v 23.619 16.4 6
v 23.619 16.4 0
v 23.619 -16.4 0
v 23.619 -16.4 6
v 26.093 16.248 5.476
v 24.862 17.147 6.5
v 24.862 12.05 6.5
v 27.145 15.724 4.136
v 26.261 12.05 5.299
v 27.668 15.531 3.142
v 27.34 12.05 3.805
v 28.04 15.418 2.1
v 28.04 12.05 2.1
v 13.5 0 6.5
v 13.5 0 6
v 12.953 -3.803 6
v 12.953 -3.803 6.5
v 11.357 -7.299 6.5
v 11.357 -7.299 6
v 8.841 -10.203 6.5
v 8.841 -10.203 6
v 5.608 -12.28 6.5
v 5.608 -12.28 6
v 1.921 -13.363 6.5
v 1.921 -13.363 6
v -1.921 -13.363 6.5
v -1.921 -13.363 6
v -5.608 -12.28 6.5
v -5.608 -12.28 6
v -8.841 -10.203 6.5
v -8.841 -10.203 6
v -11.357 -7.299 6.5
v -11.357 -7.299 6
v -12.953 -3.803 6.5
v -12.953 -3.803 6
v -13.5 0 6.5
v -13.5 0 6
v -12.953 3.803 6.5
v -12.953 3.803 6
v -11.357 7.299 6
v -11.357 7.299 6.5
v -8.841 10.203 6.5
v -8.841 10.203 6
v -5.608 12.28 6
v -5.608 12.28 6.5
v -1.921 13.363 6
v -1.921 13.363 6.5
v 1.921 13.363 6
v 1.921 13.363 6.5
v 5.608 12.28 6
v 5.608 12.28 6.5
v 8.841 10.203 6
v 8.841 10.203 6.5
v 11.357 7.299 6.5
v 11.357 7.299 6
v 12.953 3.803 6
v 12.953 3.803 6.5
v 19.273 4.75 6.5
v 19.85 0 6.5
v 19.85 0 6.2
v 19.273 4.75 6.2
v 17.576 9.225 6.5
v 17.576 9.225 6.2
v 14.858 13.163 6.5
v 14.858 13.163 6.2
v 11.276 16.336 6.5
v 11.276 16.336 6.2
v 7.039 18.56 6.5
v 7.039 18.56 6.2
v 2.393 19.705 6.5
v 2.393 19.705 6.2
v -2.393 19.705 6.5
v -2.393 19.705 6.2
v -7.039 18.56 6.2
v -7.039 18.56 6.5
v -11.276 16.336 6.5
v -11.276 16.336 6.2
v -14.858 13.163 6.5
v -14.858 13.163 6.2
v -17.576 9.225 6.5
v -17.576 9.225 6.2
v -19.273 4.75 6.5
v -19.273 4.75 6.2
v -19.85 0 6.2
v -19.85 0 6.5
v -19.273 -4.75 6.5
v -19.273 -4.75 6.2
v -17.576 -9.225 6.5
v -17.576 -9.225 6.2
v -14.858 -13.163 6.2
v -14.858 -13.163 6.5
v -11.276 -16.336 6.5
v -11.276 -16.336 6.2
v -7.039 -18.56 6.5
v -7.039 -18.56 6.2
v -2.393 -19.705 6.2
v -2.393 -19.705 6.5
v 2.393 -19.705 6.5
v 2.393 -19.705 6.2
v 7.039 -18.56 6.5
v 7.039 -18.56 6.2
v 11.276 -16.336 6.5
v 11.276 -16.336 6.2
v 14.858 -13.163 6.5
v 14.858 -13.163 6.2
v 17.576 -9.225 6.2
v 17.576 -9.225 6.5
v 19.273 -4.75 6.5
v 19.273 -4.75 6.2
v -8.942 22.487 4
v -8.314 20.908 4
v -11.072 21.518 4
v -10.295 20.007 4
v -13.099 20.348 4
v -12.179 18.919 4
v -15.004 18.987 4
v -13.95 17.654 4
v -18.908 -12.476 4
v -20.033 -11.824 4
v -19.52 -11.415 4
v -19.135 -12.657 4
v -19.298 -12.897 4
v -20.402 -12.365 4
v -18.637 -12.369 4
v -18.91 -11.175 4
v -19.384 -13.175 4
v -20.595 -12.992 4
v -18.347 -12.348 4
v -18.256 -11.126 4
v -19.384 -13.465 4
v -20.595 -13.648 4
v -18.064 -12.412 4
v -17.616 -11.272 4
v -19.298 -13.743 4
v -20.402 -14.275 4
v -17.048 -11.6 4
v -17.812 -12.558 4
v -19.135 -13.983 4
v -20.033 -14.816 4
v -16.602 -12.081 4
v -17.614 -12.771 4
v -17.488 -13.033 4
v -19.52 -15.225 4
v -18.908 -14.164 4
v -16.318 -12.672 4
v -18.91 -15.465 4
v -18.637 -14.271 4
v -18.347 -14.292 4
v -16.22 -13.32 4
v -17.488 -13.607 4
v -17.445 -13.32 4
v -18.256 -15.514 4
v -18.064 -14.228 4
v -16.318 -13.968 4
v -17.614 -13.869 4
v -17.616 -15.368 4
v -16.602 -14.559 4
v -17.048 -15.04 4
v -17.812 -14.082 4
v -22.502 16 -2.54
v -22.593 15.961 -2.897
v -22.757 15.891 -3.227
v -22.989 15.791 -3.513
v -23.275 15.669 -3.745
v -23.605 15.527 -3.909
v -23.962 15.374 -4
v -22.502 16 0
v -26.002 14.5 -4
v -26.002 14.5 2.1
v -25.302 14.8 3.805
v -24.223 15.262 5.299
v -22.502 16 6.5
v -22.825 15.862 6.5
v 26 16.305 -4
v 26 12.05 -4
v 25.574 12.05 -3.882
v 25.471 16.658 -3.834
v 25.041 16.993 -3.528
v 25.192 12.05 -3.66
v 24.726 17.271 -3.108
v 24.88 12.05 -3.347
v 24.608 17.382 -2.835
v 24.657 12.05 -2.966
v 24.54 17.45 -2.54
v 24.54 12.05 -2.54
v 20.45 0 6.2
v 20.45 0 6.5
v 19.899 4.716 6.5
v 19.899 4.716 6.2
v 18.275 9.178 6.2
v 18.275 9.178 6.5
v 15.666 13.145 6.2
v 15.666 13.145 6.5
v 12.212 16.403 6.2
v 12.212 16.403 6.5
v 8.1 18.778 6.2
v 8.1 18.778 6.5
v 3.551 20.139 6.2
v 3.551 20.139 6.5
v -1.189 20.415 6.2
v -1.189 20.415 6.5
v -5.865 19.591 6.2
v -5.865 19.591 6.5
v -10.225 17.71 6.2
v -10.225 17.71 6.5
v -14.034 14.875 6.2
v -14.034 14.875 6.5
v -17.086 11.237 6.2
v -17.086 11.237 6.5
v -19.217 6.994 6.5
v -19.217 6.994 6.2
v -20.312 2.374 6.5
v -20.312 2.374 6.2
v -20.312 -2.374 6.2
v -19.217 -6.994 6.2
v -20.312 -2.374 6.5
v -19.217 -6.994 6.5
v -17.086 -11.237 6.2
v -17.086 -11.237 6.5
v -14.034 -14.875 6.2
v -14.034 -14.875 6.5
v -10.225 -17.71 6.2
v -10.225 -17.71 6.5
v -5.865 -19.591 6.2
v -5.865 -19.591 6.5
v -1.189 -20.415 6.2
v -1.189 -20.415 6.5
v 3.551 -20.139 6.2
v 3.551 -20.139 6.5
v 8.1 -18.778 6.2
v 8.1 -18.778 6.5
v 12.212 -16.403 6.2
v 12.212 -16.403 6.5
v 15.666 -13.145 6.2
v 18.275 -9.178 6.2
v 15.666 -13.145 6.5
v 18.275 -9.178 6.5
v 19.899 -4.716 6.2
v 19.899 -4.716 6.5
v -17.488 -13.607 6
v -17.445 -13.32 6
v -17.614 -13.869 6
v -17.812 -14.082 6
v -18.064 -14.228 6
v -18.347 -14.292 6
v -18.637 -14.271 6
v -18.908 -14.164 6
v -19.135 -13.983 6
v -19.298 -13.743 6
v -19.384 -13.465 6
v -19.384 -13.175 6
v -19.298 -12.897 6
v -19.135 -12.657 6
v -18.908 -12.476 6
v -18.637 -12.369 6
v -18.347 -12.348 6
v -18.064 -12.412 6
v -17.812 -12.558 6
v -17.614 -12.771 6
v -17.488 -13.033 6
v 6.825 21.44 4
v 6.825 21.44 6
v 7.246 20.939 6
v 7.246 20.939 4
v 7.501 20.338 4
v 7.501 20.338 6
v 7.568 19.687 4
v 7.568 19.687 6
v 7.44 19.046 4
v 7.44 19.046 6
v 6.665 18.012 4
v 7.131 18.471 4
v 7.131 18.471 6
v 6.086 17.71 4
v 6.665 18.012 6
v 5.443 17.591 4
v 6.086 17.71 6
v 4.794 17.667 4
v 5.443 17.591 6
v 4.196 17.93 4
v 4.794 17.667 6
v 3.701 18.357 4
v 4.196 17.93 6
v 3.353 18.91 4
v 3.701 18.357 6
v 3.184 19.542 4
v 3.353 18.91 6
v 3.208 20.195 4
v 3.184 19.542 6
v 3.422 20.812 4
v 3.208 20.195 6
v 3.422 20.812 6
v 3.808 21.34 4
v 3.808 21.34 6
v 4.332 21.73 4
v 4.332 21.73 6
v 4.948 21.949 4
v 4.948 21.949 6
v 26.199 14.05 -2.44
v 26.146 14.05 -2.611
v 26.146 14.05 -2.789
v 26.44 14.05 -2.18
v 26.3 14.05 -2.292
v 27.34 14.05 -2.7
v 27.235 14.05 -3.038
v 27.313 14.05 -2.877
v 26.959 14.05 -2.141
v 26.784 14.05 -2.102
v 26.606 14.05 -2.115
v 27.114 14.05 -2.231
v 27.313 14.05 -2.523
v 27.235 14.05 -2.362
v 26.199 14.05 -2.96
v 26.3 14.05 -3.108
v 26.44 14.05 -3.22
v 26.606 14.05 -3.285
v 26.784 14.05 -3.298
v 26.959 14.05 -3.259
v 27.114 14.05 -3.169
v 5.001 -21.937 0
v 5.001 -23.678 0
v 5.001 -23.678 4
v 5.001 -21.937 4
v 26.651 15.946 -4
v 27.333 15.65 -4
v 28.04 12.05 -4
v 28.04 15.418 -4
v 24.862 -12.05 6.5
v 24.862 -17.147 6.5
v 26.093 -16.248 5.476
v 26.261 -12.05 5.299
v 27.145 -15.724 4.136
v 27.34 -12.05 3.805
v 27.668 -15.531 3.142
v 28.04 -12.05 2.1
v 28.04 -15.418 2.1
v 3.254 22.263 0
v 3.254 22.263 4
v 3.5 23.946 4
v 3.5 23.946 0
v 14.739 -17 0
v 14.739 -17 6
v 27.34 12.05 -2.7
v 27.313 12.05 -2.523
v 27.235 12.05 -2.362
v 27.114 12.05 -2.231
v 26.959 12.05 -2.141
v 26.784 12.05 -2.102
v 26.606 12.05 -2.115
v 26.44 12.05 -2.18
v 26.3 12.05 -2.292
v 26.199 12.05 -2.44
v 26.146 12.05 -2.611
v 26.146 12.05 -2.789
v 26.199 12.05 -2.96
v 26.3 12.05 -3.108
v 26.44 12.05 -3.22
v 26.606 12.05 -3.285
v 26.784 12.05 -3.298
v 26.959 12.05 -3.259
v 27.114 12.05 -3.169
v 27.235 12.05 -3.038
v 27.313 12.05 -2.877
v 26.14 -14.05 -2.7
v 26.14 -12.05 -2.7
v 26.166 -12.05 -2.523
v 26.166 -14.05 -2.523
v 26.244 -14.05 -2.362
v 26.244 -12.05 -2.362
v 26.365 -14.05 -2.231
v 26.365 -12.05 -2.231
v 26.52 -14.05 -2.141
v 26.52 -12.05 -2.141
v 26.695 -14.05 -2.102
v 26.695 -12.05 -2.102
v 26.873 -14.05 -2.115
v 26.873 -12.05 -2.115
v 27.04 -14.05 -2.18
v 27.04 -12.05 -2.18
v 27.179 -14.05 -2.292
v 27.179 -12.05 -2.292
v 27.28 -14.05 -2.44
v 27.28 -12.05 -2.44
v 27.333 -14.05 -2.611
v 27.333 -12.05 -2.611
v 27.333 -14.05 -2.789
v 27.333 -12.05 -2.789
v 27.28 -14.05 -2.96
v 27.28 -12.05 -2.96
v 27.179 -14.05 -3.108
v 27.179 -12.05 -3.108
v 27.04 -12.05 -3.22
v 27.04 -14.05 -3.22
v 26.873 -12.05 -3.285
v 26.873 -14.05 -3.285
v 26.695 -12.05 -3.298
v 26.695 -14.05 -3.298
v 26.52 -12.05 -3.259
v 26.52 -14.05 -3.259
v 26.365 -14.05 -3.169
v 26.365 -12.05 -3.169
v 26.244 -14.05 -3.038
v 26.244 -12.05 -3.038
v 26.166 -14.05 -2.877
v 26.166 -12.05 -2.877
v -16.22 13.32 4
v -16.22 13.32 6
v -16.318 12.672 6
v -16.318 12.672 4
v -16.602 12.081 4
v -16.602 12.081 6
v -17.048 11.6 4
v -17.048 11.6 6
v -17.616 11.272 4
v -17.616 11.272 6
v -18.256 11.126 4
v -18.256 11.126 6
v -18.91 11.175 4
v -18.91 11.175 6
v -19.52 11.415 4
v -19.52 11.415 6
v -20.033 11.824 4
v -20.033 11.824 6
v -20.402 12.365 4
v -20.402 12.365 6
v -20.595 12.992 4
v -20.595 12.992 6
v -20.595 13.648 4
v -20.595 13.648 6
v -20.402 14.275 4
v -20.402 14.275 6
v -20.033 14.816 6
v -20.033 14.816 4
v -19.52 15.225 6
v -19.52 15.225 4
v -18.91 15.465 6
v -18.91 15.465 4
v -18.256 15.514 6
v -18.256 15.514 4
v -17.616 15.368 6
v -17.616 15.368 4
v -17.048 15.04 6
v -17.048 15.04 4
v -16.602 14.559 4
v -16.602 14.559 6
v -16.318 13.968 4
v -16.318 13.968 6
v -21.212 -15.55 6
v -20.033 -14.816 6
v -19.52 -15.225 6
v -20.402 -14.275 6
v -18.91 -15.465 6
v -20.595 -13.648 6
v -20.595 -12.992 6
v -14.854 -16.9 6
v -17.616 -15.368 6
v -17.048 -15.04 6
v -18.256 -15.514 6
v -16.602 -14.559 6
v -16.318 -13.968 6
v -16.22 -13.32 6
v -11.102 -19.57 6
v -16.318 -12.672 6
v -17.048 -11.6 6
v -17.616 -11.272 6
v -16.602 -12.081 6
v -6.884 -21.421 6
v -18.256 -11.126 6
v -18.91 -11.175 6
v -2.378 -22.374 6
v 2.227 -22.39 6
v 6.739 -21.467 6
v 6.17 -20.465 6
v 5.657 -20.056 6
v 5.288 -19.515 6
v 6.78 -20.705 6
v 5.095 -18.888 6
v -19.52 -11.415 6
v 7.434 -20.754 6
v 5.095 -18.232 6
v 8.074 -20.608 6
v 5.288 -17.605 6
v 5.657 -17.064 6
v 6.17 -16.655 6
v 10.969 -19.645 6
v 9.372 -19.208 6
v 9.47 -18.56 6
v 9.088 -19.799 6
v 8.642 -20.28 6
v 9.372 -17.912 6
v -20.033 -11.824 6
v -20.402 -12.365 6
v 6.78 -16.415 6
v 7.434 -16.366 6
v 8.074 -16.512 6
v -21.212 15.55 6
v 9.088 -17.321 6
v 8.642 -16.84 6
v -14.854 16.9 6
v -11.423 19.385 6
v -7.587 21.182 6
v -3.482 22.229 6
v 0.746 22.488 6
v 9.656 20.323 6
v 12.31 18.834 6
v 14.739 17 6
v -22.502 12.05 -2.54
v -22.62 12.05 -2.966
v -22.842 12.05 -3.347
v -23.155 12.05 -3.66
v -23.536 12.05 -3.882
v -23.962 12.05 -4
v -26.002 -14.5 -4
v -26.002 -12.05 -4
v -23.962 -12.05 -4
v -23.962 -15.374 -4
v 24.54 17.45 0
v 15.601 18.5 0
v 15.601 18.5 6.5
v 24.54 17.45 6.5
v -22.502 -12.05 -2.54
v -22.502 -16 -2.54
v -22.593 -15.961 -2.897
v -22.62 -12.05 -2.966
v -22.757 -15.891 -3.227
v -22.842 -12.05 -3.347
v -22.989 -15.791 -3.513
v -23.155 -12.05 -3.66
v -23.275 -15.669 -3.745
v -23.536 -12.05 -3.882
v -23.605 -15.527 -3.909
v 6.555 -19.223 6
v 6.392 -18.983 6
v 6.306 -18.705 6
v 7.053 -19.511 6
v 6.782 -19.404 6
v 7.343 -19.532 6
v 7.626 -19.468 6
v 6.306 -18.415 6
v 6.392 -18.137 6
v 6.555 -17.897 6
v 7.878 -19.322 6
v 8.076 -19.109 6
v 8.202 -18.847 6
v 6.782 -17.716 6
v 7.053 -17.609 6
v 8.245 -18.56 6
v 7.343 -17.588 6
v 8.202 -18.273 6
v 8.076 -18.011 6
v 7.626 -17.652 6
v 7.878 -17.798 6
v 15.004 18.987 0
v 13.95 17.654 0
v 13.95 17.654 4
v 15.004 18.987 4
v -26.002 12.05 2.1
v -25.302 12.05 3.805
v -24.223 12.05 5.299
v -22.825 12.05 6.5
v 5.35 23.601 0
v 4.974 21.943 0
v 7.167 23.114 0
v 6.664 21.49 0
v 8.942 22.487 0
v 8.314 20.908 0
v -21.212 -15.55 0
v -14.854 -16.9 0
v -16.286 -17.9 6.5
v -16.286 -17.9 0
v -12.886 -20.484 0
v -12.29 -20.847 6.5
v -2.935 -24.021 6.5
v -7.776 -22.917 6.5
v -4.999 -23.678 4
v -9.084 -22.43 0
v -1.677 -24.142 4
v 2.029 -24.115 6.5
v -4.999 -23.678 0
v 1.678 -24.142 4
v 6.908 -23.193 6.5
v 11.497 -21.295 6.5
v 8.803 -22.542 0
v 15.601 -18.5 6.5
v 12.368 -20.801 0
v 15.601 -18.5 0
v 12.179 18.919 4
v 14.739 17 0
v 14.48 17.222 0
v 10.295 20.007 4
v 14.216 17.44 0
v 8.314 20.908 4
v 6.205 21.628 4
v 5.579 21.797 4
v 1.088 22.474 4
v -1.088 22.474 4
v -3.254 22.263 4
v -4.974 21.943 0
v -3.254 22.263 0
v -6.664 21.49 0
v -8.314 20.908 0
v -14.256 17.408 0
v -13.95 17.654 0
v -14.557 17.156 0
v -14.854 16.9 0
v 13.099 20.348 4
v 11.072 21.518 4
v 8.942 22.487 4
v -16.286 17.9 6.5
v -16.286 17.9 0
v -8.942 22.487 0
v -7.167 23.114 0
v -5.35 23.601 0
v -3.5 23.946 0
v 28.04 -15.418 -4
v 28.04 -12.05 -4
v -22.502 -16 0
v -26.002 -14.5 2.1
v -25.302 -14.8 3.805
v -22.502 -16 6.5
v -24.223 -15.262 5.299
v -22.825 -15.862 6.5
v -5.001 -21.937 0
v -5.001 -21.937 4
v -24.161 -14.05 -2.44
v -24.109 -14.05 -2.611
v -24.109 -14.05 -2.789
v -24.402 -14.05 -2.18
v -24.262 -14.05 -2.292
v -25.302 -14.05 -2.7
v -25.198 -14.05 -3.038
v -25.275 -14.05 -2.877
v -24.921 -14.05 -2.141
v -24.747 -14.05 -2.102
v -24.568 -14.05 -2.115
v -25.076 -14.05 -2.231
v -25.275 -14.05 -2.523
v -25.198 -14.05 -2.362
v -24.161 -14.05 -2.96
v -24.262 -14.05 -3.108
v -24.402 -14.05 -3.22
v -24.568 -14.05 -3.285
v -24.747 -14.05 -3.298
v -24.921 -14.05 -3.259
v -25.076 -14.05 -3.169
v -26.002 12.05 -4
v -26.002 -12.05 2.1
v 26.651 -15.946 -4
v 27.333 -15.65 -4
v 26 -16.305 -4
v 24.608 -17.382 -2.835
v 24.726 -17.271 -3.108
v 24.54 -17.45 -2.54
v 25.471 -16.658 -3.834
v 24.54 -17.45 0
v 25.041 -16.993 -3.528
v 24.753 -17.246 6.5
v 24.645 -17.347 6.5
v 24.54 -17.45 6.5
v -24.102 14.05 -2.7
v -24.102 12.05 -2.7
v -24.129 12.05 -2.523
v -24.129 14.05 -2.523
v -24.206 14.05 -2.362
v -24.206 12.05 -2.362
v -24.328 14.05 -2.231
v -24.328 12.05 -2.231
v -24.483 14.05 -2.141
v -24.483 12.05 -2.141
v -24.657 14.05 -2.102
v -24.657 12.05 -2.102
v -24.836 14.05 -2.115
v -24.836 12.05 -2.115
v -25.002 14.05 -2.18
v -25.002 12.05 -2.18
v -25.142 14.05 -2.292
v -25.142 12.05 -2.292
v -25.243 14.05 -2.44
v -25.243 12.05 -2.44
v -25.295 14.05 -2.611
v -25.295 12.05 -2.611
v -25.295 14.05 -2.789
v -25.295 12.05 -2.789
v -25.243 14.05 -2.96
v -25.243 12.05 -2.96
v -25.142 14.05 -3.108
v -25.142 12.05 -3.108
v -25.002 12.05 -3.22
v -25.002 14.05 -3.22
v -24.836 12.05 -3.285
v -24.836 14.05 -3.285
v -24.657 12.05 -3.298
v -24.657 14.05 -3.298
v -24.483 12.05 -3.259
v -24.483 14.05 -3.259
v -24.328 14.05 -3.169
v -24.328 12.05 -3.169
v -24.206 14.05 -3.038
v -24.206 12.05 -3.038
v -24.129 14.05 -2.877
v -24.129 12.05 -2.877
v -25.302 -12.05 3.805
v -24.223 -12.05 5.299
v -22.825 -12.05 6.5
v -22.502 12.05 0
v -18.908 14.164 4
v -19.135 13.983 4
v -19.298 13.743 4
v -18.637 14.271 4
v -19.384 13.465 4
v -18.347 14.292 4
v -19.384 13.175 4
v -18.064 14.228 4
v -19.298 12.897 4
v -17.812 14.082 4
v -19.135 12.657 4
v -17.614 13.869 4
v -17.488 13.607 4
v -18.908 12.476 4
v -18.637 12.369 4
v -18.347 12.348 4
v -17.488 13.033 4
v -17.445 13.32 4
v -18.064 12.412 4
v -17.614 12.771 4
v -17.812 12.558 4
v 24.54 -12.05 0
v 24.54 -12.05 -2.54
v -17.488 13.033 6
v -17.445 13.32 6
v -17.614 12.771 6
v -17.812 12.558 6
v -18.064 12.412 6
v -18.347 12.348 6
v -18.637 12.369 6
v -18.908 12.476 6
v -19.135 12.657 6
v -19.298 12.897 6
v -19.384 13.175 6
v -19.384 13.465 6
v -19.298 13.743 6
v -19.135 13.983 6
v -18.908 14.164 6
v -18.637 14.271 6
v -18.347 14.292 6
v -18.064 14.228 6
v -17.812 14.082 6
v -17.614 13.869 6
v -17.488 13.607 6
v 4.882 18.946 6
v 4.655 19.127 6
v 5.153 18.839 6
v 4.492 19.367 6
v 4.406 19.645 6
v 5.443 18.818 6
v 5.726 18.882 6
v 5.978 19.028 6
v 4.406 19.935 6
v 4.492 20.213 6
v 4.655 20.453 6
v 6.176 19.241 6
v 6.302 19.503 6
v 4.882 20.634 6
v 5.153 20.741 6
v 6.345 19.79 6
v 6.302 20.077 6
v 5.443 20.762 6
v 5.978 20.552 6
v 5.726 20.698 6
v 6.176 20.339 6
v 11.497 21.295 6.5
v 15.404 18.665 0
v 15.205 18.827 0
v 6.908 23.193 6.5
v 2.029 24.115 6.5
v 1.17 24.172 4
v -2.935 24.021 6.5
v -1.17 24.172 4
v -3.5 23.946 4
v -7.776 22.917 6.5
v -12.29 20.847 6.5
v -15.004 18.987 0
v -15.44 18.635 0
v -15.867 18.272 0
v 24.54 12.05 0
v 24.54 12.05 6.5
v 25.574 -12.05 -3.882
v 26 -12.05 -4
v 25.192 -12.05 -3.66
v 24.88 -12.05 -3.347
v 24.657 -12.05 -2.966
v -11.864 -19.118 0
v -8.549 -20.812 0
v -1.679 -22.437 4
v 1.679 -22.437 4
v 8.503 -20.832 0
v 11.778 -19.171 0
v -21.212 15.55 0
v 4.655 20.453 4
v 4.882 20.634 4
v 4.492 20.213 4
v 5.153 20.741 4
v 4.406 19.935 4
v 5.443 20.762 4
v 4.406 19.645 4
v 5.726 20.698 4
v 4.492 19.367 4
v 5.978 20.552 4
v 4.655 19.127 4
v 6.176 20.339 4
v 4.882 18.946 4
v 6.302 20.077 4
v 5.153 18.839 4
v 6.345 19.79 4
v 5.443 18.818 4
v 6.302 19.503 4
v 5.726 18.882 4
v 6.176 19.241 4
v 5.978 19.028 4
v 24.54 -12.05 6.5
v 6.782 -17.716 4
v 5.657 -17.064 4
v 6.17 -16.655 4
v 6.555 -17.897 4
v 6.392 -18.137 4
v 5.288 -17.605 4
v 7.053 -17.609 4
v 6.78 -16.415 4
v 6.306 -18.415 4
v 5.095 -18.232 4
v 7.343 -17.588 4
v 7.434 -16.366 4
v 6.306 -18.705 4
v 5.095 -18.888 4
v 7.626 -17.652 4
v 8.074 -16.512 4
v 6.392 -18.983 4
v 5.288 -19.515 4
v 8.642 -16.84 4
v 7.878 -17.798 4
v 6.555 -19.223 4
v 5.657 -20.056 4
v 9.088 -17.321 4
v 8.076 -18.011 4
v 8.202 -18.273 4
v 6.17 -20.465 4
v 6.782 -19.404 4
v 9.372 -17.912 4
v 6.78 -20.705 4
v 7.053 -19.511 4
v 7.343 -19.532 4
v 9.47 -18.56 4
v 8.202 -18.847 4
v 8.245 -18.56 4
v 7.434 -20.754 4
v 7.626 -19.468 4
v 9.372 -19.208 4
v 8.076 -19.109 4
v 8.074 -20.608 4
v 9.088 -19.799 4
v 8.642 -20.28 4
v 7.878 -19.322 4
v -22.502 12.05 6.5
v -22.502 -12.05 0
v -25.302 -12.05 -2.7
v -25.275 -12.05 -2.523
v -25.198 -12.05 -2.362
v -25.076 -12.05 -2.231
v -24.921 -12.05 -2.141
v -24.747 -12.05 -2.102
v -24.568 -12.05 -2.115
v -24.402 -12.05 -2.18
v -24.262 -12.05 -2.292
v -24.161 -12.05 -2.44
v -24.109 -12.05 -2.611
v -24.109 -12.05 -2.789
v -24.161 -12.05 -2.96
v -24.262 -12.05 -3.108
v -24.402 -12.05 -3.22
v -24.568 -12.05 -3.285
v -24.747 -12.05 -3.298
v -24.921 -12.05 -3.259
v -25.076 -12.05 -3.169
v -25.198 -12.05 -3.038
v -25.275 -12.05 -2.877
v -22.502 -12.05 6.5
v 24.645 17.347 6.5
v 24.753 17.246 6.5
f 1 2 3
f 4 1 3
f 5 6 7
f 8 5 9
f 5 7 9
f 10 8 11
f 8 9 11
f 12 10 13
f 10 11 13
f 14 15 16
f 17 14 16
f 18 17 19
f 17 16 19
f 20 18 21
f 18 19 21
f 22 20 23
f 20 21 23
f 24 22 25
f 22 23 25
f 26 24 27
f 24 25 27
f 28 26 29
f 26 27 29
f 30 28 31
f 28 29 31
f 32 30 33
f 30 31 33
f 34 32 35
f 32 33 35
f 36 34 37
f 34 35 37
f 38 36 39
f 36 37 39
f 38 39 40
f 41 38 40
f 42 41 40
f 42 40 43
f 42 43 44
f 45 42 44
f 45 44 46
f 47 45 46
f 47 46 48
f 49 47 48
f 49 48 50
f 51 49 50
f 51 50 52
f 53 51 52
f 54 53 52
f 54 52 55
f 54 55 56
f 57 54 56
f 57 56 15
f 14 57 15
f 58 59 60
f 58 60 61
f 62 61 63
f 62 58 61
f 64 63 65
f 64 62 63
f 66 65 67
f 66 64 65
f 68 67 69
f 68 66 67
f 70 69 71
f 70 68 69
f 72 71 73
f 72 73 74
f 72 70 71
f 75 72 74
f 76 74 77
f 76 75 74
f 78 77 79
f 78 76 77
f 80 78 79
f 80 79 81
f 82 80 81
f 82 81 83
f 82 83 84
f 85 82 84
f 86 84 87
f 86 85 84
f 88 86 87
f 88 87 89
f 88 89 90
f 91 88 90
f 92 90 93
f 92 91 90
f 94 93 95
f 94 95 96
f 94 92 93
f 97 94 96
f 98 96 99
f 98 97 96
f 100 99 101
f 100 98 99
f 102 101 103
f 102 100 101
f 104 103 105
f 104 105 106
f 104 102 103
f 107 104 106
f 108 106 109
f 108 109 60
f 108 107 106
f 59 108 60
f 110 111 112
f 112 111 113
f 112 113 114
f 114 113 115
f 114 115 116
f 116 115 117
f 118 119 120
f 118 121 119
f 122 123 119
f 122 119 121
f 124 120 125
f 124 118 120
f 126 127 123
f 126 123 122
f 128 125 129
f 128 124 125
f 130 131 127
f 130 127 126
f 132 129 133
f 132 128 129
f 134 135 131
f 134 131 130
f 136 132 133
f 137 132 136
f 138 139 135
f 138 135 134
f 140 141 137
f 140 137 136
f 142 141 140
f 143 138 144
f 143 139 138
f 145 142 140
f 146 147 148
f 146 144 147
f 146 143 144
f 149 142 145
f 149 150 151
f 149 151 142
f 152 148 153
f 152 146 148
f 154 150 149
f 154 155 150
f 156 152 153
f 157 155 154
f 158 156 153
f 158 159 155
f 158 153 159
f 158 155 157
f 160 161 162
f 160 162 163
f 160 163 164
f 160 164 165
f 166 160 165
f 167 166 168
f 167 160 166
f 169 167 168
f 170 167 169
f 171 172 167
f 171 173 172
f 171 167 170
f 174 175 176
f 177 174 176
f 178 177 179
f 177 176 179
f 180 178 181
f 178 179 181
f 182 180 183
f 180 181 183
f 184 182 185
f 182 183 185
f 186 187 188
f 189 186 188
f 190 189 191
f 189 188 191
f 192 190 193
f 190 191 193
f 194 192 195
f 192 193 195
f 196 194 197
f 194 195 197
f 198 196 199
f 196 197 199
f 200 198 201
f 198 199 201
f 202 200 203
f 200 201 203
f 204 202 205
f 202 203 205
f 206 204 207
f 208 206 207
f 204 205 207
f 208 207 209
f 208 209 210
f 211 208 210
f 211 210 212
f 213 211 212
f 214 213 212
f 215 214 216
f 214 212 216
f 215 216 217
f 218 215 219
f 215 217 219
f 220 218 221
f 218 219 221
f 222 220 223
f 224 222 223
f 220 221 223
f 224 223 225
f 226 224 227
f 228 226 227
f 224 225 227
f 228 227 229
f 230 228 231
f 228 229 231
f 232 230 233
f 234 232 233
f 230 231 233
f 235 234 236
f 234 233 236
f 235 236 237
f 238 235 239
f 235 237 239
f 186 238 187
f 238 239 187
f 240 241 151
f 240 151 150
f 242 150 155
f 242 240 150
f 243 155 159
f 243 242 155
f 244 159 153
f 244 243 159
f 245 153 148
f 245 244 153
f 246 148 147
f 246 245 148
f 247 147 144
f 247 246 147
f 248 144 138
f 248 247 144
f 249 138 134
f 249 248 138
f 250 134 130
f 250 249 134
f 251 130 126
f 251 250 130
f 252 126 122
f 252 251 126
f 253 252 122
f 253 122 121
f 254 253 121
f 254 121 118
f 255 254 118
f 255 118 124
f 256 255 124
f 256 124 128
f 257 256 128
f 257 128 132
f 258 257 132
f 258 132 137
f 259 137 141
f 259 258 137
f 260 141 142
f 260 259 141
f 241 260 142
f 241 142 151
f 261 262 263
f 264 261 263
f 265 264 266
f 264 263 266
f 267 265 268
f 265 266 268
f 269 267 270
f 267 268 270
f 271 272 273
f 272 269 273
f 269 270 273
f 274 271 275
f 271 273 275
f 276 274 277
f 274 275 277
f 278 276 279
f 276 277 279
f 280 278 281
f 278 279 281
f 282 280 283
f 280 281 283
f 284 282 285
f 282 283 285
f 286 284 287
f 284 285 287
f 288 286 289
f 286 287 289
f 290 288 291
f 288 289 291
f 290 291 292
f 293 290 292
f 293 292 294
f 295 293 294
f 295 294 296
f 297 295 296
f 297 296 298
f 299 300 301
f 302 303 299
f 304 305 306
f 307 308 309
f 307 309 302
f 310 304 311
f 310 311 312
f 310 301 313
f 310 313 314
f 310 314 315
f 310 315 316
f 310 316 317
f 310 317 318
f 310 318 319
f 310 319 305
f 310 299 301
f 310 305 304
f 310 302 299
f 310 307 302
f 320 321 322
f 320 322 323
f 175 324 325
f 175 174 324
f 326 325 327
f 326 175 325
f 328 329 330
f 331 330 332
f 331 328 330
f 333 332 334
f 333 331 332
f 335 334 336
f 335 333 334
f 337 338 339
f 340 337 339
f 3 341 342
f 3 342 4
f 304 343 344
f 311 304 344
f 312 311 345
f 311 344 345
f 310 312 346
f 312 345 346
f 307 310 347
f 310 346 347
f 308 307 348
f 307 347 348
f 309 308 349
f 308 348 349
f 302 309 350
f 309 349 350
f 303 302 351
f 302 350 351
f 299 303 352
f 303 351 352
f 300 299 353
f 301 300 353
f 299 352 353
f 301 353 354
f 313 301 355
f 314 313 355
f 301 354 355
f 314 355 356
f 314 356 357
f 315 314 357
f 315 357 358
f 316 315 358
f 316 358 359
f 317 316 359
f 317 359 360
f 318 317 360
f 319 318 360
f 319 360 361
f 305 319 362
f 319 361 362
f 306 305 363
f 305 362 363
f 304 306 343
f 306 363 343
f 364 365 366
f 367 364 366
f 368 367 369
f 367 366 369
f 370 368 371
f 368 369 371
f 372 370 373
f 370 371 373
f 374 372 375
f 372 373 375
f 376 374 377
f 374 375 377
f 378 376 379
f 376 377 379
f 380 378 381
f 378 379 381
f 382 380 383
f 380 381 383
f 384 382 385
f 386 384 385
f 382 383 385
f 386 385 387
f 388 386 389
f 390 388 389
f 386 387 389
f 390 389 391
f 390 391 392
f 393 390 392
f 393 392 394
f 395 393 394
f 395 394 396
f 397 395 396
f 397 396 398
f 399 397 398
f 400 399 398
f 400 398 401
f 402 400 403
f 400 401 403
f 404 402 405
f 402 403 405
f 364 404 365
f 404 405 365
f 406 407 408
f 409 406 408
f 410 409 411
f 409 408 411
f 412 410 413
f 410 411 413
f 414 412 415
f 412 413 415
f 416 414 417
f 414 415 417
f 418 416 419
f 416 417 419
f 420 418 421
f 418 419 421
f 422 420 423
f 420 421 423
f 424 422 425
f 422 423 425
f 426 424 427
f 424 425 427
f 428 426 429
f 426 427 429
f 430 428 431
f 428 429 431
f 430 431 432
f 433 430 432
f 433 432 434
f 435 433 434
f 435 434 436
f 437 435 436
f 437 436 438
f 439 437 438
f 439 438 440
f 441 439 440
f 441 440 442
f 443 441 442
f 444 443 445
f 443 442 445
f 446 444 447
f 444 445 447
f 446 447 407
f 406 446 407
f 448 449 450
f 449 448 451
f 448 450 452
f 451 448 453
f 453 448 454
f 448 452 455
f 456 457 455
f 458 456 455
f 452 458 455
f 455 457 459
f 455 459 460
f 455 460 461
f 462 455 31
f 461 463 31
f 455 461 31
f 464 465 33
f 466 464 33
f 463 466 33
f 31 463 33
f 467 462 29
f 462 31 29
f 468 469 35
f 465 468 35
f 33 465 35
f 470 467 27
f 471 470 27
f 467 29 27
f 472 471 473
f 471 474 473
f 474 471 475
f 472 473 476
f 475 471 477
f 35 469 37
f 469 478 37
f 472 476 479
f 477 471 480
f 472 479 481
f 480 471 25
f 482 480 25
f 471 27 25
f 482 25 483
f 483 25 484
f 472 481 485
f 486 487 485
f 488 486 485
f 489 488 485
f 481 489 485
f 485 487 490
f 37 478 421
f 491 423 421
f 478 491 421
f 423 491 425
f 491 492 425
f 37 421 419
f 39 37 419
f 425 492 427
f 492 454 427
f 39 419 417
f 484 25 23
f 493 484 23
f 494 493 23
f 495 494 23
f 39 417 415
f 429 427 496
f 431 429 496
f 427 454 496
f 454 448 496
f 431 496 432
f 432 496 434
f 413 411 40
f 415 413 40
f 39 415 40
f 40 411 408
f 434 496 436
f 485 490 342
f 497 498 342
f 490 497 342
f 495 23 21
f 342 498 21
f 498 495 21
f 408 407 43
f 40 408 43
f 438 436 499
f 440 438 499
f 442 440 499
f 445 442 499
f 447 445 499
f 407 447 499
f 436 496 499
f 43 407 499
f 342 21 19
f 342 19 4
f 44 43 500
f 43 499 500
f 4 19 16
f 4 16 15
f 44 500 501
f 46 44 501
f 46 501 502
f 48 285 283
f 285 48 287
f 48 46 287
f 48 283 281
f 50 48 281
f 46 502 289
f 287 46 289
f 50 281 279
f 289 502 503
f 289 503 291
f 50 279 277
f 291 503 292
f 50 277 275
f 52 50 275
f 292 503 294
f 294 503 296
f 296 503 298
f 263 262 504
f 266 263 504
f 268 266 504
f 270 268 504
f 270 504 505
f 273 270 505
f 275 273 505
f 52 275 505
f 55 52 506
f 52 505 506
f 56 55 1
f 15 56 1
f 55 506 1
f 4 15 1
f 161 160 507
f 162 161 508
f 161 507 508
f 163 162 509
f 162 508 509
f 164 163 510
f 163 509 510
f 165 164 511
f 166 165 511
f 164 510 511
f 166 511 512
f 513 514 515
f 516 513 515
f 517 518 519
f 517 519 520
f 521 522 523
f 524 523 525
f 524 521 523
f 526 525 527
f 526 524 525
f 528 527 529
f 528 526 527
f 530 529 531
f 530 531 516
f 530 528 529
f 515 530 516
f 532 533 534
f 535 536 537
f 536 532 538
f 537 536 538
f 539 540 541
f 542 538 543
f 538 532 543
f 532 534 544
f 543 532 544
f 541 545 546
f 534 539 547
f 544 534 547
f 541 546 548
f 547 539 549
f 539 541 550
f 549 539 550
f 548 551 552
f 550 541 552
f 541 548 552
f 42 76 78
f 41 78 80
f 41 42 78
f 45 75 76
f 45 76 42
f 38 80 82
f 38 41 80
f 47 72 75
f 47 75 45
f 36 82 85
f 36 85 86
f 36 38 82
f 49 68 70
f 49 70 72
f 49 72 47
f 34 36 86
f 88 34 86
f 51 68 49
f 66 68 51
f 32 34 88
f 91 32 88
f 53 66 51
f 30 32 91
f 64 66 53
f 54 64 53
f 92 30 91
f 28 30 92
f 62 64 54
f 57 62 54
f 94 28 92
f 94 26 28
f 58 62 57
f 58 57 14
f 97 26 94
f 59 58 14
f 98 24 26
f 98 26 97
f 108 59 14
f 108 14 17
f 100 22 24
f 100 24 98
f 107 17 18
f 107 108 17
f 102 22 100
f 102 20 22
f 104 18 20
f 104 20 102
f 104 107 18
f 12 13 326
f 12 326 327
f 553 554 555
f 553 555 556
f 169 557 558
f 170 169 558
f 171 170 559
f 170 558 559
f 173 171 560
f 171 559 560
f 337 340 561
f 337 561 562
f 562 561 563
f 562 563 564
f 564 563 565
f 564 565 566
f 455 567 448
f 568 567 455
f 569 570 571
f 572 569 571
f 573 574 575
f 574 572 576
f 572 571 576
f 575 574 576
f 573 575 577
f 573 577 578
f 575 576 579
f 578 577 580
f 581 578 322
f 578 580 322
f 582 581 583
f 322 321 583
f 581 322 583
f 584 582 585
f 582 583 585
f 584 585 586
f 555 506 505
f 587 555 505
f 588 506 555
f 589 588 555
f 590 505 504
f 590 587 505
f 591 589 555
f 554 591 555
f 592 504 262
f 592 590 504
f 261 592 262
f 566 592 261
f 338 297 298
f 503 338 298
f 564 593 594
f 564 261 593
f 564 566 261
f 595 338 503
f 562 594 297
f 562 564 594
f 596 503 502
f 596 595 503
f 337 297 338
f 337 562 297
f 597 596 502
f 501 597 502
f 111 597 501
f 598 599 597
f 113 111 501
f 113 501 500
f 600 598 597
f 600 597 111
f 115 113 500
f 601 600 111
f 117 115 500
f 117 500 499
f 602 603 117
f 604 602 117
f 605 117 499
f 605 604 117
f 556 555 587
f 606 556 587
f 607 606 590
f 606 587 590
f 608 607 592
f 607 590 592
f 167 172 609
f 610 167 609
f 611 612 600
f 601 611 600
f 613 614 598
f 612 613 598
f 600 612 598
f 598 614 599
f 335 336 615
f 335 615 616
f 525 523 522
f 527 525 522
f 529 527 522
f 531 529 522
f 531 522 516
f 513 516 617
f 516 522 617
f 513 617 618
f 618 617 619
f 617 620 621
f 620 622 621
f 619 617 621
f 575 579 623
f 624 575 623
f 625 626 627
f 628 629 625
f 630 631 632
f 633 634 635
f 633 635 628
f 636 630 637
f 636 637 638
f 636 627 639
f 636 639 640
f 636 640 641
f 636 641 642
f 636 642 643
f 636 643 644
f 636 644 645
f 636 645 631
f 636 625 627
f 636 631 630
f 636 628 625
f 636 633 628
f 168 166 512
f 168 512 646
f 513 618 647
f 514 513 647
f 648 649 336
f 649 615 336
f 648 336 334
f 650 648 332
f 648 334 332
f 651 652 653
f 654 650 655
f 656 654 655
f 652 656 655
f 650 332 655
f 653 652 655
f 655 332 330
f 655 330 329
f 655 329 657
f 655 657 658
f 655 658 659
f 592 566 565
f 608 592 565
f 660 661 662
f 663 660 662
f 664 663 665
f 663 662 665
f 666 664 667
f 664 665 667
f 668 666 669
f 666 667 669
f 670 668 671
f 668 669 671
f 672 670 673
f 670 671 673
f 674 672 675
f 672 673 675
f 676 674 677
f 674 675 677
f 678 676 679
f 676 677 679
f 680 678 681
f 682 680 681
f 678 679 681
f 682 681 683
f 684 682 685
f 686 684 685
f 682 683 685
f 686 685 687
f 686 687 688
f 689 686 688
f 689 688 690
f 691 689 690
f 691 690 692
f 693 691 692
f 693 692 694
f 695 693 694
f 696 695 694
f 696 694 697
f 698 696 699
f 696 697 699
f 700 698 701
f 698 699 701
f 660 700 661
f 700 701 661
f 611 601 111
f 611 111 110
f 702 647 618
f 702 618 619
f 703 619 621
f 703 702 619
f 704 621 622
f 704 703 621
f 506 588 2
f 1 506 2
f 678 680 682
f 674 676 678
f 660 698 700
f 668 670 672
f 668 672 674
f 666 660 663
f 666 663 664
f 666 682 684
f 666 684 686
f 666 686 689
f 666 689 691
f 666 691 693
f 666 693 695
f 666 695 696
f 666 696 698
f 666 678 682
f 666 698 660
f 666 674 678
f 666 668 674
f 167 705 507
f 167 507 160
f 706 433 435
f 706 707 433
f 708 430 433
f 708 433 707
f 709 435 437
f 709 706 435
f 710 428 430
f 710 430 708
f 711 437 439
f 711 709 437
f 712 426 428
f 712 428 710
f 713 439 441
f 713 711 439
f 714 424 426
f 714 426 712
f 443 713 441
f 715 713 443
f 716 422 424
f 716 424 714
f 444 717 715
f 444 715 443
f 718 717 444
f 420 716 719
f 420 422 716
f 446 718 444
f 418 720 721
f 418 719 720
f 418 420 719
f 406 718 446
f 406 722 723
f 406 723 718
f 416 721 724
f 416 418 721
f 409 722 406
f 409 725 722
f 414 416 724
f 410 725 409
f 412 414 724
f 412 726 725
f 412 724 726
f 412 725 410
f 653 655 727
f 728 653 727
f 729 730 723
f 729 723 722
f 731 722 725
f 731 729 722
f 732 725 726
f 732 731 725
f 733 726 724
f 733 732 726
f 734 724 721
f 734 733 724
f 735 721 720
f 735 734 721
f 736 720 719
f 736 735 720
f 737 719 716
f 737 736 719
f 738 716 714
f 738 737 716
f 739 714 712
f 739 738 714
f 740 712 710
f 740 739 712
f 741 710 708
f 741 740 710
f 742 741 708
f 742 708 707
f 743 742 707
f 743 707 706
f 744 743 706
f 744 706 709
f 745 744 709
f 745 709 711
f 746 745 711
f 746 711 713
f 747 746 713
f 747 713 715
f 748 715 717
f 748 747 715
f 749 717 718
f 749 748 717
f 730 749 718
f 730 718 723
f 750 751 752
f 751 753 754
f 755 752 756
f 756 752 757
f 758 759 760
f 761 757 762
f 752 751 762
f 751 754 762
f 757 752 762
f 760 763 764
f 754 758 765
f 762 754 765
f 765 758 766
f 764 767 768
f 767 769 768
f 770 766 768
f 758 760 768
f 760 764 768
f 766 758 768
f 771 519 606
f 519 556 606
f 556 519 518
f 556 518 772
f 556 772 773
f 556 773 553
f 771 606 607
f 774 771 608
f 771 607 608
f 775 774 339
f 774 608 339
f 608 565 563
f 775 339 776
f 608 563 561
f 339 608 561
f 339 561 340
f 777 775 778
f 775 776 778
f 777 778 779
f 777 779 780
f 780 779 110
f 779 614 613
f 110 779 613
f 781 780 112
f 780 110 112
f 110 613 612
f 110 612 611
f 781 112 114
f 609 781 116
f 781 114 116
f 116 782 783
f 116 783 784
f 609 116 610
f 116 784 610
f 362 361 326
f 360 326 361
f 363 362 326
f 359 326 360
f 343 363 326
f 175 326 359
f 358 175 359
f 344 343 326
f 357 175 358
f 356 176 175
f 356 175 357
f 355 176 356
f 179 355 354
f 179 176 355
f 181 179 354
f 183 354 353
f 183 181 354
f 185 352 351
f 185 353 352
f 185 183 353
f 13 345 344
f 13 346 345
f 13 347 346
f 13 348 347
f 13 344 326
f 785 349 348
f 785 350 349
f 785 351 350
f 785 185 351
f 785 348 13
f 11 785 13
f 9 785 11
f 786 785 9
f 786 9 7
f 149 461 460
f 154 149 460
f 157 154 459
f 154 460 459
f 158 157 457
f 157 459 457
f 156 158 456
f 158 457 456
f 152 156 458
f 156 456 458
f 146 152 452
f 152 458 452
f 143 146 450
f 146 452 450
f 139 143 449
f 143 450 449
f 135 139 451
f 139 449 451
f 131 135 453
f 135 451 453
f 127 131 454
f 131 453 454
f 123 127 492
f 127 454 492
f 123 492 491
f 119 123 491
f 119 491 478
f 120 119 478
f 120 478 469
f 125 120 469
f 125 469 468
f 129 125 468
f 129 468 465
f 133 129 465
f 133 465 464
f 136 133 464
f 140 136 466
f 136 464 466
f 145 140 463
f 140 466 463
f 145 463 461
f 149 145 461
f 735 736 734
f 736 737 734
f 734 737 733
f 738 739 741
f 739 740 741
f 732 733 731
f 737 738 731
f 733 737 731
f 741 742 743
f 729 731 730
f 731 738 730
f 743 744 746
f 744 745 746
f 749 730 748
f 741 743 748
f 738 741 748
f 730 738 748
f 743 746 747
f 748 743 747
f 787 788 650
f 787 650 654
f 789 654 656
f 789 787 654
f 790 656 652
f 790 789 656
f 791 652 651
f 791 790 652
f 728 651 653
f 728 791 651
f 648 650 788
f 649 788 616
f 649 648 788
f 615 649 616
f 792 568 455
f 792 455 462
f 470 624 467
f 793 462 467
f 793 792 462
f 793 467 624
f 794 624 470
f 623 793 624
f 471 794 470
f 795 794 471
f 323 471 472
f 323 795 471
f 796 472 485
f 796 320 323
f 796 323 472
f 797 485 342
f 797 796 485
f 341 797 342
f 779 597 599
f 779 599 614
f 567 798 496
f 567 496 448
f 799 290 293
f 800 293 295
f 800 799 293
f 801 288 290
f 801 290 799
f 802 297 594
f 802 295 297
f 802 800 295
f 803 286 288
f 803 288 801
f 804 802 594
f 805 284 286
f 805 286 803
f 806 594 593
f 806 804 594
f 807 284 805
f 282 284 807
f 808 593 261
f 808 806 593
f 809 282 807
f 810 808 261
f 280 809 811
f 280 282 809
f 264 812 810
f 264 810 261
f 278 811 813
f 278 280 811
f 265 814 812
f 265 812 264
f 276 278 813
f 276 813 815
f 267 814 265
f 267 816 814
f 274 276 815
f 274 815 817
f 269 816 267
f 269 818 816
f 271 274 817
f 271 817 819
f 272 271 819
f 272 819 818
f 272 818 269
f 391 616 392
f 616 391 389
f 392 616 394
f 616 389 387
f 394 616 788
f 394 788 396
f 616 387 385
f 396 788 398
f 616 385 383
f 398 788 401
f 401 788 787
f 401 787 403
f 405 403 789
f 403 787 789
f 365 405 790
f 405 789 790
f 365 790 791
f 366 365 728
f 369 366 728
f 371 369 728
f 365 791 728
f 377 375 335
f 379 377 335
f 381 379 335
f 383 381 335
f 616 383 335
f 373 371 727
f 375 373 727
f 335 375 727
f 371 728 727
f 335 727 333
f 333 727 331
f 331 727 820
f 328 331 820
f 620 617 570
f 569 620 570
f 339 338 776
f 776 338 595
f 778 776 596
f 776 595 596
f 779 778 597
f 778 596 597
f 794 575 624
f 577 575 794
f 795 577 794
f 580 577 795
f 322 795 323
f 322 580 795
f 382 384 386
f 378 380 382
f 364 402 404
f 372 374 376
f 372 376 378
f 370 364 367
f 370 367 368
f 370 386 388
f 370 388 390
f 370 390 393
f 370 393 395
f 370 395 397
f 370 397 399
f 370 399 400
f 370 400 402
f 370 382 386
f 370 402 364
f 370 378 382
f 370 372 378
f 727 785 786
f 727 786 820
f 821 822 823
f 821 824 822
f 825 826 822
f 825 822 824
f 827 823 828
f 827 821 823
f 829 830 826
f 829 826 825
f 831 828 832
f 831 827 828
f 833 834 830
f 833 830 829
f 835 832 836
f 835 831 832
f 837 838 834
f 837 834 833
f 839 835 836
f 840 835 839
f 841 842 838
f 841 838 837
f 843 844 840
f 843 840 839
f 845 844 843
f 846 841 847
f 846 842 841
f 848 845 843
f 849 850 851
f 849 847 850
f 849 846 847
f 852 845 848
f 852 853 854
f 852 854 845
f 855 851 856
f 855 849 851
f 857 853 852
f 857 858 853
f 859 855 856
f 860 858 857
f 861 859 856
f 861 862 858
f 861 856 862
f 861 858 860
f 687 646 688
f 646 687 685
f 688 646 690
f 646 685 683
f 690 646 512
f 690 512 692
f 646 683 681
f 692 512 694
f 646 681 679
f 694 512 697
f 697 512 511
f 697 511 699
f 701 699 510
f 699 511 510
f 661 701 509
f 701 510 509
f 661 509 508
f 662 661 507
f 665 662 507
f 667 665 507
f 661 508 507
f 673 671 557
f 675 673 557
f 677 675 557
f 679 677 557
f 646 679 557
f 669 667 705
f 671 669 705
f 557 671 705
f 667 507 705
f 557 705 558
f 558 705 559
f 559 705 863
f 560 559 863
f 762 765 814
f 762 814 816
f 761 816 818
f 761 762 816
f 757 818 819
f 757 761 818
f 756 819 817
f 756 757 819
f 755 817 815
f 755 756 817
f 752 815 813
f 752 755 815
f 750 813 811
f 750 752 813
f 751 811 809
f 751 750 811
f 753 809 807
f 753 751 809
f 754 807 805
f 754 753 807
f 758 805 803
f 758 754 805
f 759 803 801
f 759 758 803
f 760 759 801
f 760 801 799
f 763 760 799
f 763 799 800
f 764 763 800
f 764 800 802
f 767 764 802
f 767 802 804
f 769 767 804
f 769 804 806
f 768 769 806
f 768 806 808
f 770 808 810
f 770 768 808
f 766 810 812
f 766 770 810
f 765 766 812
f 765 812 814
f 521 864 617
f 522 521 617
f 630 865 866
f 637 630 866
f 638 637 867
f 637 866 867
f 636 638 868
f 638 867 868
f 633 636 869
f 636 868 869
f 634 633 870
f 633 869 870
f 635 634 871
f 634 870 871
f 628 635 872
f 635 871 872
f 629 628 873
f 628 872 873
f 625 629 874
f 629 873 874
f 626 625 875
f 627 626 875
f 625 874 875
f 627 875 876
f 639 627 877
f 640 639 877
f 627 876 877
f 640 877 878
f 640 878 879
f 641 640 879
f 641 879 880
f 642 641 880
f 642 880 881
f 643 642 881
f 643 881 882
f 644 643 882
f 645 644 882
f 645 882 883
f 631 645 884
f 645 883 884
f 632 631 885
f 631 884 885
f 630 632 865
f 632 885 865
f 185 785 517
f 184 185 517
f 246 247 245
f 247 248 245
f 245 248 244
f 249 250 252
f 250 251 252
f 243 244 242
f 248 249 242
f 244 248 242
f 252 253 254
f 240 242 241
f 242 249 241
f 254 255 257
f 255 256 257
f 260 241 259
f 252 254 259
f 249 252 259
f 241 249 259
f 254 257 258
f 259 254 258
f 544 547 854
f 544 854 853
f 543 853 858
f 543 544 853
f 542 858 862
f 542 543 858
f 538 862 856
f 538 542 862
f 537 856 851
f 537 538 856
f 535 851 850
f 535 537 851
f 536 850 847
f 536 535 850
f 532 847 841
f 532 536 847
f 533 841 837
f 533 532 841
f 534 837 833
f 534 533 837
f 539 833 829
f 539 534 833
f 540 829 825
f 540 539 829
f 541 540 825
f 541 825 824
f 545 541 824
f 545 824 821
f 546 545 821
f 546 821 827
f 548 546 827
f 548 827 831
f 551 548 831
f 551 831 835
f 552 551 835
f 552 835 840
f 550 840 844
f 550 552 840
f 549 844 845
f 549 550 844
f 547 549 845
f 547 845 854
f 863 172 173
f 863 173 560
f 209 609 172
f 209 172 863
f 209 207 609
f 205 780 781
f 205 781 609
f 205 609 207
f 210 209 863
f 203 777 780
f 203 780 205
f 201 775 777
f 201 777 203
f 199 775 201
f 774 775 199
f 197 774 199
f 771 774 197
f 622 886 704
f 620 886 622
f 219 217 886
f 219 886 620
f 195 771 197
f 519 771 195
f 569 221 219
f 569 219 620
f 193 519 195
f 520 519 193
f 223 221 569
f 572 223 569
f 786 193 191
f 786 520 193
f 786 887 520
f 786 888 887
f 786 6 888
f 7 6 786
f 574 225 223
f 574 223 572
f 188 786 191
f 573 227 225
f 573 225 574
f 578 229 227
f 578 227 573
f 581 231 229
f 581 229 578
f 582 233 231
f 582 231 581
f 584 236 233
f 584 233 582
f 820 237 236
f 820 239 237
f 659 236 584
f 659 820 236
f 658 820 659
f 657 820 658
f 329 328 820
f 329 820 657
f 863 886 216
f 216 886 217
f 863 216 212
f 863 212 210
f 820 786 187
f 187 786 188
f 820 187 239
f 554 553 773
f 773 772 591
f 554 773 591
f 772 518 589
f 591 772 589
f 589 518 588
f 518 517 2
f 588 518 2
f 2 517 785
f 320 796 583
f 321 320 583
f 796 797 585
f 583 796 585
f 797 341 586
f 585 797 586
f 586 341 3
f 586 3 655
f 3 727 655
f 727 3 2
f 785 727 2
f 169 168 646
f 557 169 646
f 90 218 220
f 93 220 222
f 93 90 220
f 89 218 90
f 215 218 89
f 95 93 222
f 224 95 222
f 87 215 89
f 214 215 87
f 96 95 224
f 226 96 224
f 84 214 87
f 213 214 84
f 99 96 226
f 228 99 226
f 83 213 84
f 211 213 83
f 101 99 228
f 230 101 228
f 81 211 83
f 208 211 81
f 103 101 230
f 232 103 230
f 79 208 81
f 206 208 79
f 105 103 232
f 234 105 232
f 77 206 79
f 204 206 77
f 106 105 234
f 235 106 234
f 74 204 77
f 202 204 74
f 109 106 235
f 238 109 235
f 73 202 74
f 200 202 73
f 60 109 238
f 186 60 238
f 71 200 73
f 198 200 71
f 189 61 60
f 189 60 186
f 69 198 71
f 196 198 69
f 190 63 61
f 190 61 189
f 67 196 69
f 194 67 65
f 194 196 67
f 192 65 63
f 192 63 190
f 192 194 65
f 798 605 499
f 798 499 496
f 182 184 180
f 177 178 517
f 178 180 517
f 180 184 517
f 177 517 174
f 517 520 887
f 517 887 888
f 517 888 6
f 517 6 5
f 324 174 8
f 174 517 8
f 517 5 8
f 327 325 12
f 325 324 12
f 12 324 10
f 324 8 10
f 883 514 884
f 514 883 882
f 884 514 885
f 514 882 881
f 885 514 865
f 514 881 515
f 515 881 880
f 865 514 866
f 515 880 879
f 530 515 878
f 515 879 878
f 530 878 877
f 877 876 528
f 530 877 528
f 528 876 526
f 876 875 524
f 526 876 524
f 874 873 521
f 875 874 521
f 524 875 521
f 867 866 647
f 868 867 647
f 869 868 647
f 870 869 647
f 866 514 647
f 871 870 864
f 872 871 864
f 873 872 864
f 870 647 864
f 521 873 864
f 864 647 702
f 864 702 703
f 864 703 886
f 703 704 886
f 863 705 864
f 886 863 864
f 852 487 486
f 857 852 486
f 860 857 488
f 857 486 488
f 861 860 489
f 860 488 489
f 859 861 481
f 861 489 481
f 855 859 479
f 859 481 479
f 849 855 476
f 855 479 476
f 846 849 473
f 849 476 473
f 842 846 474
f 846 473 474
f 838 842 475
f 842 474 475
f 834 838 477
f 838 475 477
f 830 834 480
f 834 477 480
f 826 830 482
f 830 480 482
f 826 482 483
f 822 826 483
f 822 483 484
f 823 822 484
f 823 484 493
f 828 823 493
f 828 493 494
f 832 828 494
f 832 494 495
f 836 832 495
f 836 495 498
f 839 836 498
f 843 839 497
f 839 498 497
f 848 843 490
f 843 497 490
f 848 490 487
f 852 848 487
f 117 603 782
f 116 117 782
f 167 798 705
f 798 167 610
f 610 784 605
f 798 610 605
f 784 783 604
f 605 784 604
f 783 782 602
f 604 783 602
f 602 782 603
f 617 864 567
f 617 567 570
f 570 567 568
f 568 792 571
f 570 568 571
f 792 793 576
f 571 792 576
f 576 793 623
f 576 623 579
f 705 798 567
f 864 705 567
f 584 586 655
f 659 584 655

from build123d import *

# Parameters (mm, degrees)
PAD_DEPTH            = 6.5
POCKET_DEPTH         = 6
SKETCH002_R          = 13.5
POCKET001_DEPTH      = 1
SKETCH003_W          = 5.4
SKETCH003_H          = 6.5
PAD001_DEPTH         = 3.5
POCKET002_DEPTH      = 10
SKETCH010_W          = 3.95
SKETCH010_H          = 6.5
PAD002_DEPTH         = 3.5
POCKET005_DEPTH      = 10
SKETCH014_R          = 20.45
SKETCH014_R_2        = 19.85
POCKET008_DEPTH      = 0.3
SKETCH015_R          = 2.2
SKETCH015_R_2        = 0.975
PAD003_DEPTH         = 2
POCKET009_DEPTH      = 4
POCKET010_DEPTH      = 4
PAD004_DEPTH         = 4
POCKET013_DEPTH      = 12.151
POCKET013_DEPTH_BACK = 36.251
SKETCH022_R          = 0.6
POCKET014_DEPTH      = 2
SKETCH023_R          = 0.6
POCKET015_DEPTH      = 2


with BuildPart() as part:
    # Sketch → Pad (new body)
    with BuildSketch(Plane.XY):
        with BuildLine():
            Line((-22.5019915649, 16), (-22.5019915649, -16))
            Line((-22.5019915649, -16), (-16.2858834578, -17.9))
            ThreePointArc((-16.2858834578, -17.9), (-0.4552796053, -24.1957169863), (15.6009615088, -18.5))
            Line((15.6009615088, -18.5), (24.5395016581, -17.45))
            Line((24.5395016581, 17.45), (24.5395016581, -17.45))
            Line((15.6009615088, 18.5), (24.5395016581, 17.45))
            ThreePointArc((15.6009615088, 18.5), (-0.4552796053, 24.1957169863), (-16.2858834578, 17.9))
            Line((-22.5019915649, 16), (-16.2858834578, 17.9))
        make_face()
    extrude(amount=PAD_DEPTH)

    # Sketch001 → Pocket (cut)
    with BuildSketch(Plane.XY):
        with BuildLine():
            Line((-14.8539557021, 16.9), (-21.2122180433, 15.55))
            Line((-21.2122180433, 15.55), (-21.2122180433, -15.55))
            Line((-21.2122180433, -15.55), (-14.8539557021, -16.9))
            ThreePointArc((-14.8539557021, -16.9), (-0.0760301383, -22.4998715423), (14.739402973, -17))
            Line((14.739402973, -17), (23.6191552218, -16.4))
            Line((23.6191552218, 16.4), (23.6191552218, -16.4))
            Line((14.739402973, 17), (23.6191552218, 16.4))
            ThreePointArc((14.739402973, 17), (-0.0760301383, 22.4998715423), (-14.8539557021, 16.9))
        make_face()
    extrude(amount=POCKET_DEPTH, mode=Mode.SUBTRACT)

    # Sketch002 (on Face19 of Pocket) → Pocket001 (cut)
    with BuildSketch(Plane(origin=(0, 0, 6), x_dir=(1, 0, 0), z_dir=(0, 0, -1))):
        Circle(SKETCH002_R)
    extrude(amount=-POCKET001_DEPTH, mode=Mode.SUBTRACT)

    # Sketch003 (on Face7 of Pad) → Pad001 (join)
    with BuildSketch(Plane.YZ.offset(24.5395016581)):
        with Locations((-14.75, 3.25)):
            Rectangle(SKETCH003_W, SKETCH003_H)
        with Locations((14.75, 3.25)):
            Rectangle(SKETCH003_W, SKETCH003_H)
    extrude(amount=PAD001_DEPTH)

    # Sketch006 (on Face22 of Pad001) → Pocket002 (cut)
    with BuildSketch(Plane.XY.offset(6.5)):
        with BuildLine():
            ThreePointArc((24.5395016581, 17.45), (26.1592830786, 16.2095505764), (28.0395016581, 15.4176006311))
            Line((28.0395016581, 17.45), (28.0395016581, 15.4176006311))
            Line((28.0395016581, 17.45), (24.5395016581, 17.45))
        make_face()
        with BuildLine():
            ThreePointArc((28.0395016581, -15.4176006311), (26.1592830786, -16.2095505765), (24.5395016581, -17.4500000001))
            Line((28.0395016581, -17.45), (24.5395016581, -17.45))
            Line((28.0395016581, -15.4176006311), (28.0395016581, -17.45))
        make_face()
    extrude(amount=-POCKET002_DEPTH, mode=Mode.SUBTRACT)

    # Sketch010 (on Face3 of Pad) → Pad002 (join)
    with BuildSketch(Plane(origin=(-22.5019915649, 0, 0), x_dir=(0, -1, 0), z_dir=(-1, 0, 0))):
        with Locations((-14.025, 3.25)):
            Rectangle(SKETCH010_W, SKETCH010_H)
        with Locations((14.025, 3.25)):
            Rectangle(SKETCH010_W, SKETCH010_H)
    extrude(amount=PAD002_DEPTH)

    # Sketch011 (on Face28 of Pad002) → Pocket005 (cut)
    with BuildSketch(Plane.XY.offset(6.5)):
        Polygon((-26.0019915649, 16), (-22.5019915649, 16), (-26.0019915649, 14.5), align=None)
        Polygon((-22.5019915649, -16), (-26.0019915649, -14.5), (-26.0019915649, -16), align=None)
    extrude(amount=-POCKET005_DEPTH, mode=Mode.SUBTRACT)

    # Sketch014 (on Face10 of Pad) → Pocket008 (cut)
    with BuildSketch(Plane.XY.offset(6.5)):
        Circle(SKETCH014_R)
        Circle(SKETCH014_R_2, mode=Mode.SUBTRACT)
    extrude(amount=-POCKET008_DEPTH, mode=Mode.SUBTRACT)

    # Sketch015 (on Face19 of Pocket) → Pad003 (join)
    with BuildSketch(Plane(origin=(0, 0, 6), x_dir=(1, 0, 0), z_dir=(0, 0, -1))):
        with Locations((-18.42, 13.32)):
            Circle(SKETCH015_R)
        with Locations((-18.42, 13.32)):
            Circle(SKETCH015_R_2, mode=Mode.SUBTRACT)
        with Locations((7.27, 18.56)):
            Circle(SKETCH015_R)
        with Locations((7.27, 18.56)):
            Circle(SKETCH015_R_2, mode=Mode.SUBTRACT)
        with Locations((5.37, -19.79)):
            Circle(SKETCH015_R)
        with Locations((5.37, -19.79)):
            Circle(SKETCH015_R_2, mode=Mode.SUBTRACT)
        with Locations((-18.42, -13.32)):
            Circle(SKETCH015_R)
        with Locations((-18.42, -13.32)):
            Circle(SKETCH015_R_2, mode=Mode.SUBTRACT)
    extrude(amount=PAD003_DEPTH)

    # Sketch016 (on Face4 of Pocket) → Pocket009 (cut)
    with BuildSketch(Plane(origin=(0, 0, 0), x_dir=(1, 0, 0), z_dir=(0, 0, -1))):
        with BuildLine():
            Line((-4.9992330338, 23.6779996848), (-5.0007669662, 21.9372361465))
            ThreePointArc((5.0007669662, 21.9372361465), (0, 22.5), (-5.0007669662, 21.9372361465))
            Line((5.0007669662, 23.6776757675), (5.0007669662, 21.9372361465))
            ThreePointArc((5.0007669662, 23.6776757675), (0.00078388, 24.1999999873), (-4.9992330338, 23.6779996848))
        make_face()
    extrude(amount=-POCKET009_DEPTH, mode=Mode.SUBTRACT)

    # Sketch017 (on Face4 of Pocket) → Pocket010 (cut)
    with BuildSketch(Plane(origin=(0, 0, 0), x_dir=(1, 0, 0), z_dir=(0, 0, -1))):
        with BuildLine():
            ThreePointArc((-3.2541322314, -22.2634369184), (0, -22.5), (3.2541322314, -22.2634369184))
            Line((3.2541322314, -22.2634369184), (3.5, -23.9455632634))
            ThreePointArc((-3.5, -23.9455632634), (0, -24.2), (3.5, -23.9455632634))
            Line((-3.2541322314, -22.2634369184), (-3.5, -23.9455632634))
        make_face()
        with BuildLine():
            ThreePointArc((-13.9498796389, -17.6536358312), (-11.25, -19.4855715851), (-8.3135572795, -20.9077680626))
            Line((-8.3135572795, -20.9077680626), (-8.9416927184, -22.487466094))
            ThreePointArc((-15.0038705449, -18.987466094), (-12.1, -20.9578147716), (-8.9416927184, -22.487466094))
            Line((-13.9498796389, -17.6536358312), (-15.0038705449, -18.987466094))
        make_face()
        with BuildLine():
            ThreePointArc((8.3135572795, -20.9077680626), (11.25, -19.4855715851), (13.9498796389, -17.6536358312))
            Line((13.9498796389, -17.6536358312), (15.0038705449, -18.987466094))
            ThreePointArc((8.9416927184, -22.487466094), (12.1, -20.9578147716), (15.0038705449, -18.987466094))
            Line((8.3135572795, -20.9077680626), (8.9416927184, -22.487466094))
        make_face()
    extrude(amount=-POCKET010_DEPTH, mode=Mode.SUBTRACT)

    # Sketch018 (on Face8 of Pocket005) → Pad004 (join)
    with BuildSketch(Plane(origin=(0, 0, 0), x_dir=(1, 0, 0), z_dir=(0, 0, -1))):
        Polygon((-26.0019915649, 14.5), (-26.0019915649, 12.05), (-22.5019915649, 12.05), (-22.5019915649, 16), align=None)
        Polygon((-26.0019915649, -12.05), (-22.5019915649, -12.05), (-22.5019915649, -16), (-26.0019915649, -14.5), align=None)
        with BuildLine():
            Line((24.5395016581, 17.4500000001), (24.5395016581, 12.05))
            Line((28.0395016581, 12.05), (24.5395016581, 12.05))
            Line((28.0395016581, 15.4176006311), (28.0395016581, 12.05))
            ThreePointArc((24.5395016581, 17.4500000001), (26.1592830786, 16.2095505765), (28.0395016581, 15.4176006311))
        make_face()
        with BuildLine():
            Line((24.5395016581, -12.05), (24.5395016581, -17.45))
            ThreePointArc((28.0395016581, -15.4176006311), (26.1592830786, -16.2095505764), (24.5395016581, -17.45))
            Line((28.0395016581, -12.05), (28.0395016581, -15.4176006311))
            Line((24.5395016581, -12.05), (28.0395016581, -12.05))
        make_face()
    extrude(amount=PAD004_DEPTH)

    # Sketch021 (on Face50 of Pad004) → Pocket013 (cut, two sides)
    with BuildSketch(Plane(origin=(0, -12.05, 0), x_dir=(-1, 0, 0), z_dir=(0, 1, 0))) as pocket013_sk:
        with BuildLine():
            Line((-24.8620157143, 6.5), (-28.0395016581, 6.5))
            Line((-28.0395016581, 6.5), (-28.0395016581, 2.1))
            ThreePointArc((-24.8620157143, 6.5), (-26.8441838951, 4.5841143344), (-28.0395016581, 2.1))
        make_face()
        with BuildLine():
            ThreePointArc((-25.9995016581, -4), (-25.0260575173, -3.5134441408), (-24.5395016581, -2.54))
            Line((-24.5395016581, -4), (-24.5395016581, -2.54))
            Line((-24.5395016581, -4), (-25.9995016581, -4))
        make_face()
        with BuildLine():
            Line((22.5019915649, -4), (22.5019915649, -2.54))
            ThreePointArc((22.5019915649, -2.54), (22.9885474241, -3.5134441408), (23.9619915649, -4))
            Line((22.5019915649, -4), (23.9619915649, -4))
        make_face()
        with BuildLine():
            Line((26.0019915649, 6.5), (26.0019915649, 2.1))
            ThreePointArc((26.0019915649, 2.1), (24.806673802, 4.5841143344), (22.8245056212, 6.5))
            Line((26.0019915649, 6.5), (22.8245056212, 6.5))
        make_face()
    extrude(amount=-POCKET013_DEPTH, mode=Mode.SUBTRACT)
    extrude(pocket013_sk.sketch, amount=POCKET013_DEPTH_BACK, mode=Mode.SUBTRACT)

    # Sketch022 (on Face66 of Pocket013) → Pocket014 (cut)
    with BuildSketch(Plane.XZ.offset(-12.05)):
        with Locations((-24.7019915649, -2.7)):
            Circle(SKETCH022_R)
        with Locations((26.7395016581, -2.7)):
            Circle(SKETCH022_R)
    extrude(amount=-POCKET014_DEPTH, mode=Mode.SUBTRACT)

    # Sketch023 (on Face49 of Pocket014) → Pocket015 (cut)
    with BuildSketch(Plane(origin=(0, -12.05, 0), x_dir=(-1, 0, 0), z_dir=(0, 1, 0))):
        with Locations((-26.7395016581, -2.7)):
            Circle(SKETCH023_R)
        with Locations((24.7019915649, -2.7)):
            Circle(SKETCH023_R)
    extrude(amount=-POCKET015_DEPTH, mode=Mode.SUBTRACT)


solid = part.part
